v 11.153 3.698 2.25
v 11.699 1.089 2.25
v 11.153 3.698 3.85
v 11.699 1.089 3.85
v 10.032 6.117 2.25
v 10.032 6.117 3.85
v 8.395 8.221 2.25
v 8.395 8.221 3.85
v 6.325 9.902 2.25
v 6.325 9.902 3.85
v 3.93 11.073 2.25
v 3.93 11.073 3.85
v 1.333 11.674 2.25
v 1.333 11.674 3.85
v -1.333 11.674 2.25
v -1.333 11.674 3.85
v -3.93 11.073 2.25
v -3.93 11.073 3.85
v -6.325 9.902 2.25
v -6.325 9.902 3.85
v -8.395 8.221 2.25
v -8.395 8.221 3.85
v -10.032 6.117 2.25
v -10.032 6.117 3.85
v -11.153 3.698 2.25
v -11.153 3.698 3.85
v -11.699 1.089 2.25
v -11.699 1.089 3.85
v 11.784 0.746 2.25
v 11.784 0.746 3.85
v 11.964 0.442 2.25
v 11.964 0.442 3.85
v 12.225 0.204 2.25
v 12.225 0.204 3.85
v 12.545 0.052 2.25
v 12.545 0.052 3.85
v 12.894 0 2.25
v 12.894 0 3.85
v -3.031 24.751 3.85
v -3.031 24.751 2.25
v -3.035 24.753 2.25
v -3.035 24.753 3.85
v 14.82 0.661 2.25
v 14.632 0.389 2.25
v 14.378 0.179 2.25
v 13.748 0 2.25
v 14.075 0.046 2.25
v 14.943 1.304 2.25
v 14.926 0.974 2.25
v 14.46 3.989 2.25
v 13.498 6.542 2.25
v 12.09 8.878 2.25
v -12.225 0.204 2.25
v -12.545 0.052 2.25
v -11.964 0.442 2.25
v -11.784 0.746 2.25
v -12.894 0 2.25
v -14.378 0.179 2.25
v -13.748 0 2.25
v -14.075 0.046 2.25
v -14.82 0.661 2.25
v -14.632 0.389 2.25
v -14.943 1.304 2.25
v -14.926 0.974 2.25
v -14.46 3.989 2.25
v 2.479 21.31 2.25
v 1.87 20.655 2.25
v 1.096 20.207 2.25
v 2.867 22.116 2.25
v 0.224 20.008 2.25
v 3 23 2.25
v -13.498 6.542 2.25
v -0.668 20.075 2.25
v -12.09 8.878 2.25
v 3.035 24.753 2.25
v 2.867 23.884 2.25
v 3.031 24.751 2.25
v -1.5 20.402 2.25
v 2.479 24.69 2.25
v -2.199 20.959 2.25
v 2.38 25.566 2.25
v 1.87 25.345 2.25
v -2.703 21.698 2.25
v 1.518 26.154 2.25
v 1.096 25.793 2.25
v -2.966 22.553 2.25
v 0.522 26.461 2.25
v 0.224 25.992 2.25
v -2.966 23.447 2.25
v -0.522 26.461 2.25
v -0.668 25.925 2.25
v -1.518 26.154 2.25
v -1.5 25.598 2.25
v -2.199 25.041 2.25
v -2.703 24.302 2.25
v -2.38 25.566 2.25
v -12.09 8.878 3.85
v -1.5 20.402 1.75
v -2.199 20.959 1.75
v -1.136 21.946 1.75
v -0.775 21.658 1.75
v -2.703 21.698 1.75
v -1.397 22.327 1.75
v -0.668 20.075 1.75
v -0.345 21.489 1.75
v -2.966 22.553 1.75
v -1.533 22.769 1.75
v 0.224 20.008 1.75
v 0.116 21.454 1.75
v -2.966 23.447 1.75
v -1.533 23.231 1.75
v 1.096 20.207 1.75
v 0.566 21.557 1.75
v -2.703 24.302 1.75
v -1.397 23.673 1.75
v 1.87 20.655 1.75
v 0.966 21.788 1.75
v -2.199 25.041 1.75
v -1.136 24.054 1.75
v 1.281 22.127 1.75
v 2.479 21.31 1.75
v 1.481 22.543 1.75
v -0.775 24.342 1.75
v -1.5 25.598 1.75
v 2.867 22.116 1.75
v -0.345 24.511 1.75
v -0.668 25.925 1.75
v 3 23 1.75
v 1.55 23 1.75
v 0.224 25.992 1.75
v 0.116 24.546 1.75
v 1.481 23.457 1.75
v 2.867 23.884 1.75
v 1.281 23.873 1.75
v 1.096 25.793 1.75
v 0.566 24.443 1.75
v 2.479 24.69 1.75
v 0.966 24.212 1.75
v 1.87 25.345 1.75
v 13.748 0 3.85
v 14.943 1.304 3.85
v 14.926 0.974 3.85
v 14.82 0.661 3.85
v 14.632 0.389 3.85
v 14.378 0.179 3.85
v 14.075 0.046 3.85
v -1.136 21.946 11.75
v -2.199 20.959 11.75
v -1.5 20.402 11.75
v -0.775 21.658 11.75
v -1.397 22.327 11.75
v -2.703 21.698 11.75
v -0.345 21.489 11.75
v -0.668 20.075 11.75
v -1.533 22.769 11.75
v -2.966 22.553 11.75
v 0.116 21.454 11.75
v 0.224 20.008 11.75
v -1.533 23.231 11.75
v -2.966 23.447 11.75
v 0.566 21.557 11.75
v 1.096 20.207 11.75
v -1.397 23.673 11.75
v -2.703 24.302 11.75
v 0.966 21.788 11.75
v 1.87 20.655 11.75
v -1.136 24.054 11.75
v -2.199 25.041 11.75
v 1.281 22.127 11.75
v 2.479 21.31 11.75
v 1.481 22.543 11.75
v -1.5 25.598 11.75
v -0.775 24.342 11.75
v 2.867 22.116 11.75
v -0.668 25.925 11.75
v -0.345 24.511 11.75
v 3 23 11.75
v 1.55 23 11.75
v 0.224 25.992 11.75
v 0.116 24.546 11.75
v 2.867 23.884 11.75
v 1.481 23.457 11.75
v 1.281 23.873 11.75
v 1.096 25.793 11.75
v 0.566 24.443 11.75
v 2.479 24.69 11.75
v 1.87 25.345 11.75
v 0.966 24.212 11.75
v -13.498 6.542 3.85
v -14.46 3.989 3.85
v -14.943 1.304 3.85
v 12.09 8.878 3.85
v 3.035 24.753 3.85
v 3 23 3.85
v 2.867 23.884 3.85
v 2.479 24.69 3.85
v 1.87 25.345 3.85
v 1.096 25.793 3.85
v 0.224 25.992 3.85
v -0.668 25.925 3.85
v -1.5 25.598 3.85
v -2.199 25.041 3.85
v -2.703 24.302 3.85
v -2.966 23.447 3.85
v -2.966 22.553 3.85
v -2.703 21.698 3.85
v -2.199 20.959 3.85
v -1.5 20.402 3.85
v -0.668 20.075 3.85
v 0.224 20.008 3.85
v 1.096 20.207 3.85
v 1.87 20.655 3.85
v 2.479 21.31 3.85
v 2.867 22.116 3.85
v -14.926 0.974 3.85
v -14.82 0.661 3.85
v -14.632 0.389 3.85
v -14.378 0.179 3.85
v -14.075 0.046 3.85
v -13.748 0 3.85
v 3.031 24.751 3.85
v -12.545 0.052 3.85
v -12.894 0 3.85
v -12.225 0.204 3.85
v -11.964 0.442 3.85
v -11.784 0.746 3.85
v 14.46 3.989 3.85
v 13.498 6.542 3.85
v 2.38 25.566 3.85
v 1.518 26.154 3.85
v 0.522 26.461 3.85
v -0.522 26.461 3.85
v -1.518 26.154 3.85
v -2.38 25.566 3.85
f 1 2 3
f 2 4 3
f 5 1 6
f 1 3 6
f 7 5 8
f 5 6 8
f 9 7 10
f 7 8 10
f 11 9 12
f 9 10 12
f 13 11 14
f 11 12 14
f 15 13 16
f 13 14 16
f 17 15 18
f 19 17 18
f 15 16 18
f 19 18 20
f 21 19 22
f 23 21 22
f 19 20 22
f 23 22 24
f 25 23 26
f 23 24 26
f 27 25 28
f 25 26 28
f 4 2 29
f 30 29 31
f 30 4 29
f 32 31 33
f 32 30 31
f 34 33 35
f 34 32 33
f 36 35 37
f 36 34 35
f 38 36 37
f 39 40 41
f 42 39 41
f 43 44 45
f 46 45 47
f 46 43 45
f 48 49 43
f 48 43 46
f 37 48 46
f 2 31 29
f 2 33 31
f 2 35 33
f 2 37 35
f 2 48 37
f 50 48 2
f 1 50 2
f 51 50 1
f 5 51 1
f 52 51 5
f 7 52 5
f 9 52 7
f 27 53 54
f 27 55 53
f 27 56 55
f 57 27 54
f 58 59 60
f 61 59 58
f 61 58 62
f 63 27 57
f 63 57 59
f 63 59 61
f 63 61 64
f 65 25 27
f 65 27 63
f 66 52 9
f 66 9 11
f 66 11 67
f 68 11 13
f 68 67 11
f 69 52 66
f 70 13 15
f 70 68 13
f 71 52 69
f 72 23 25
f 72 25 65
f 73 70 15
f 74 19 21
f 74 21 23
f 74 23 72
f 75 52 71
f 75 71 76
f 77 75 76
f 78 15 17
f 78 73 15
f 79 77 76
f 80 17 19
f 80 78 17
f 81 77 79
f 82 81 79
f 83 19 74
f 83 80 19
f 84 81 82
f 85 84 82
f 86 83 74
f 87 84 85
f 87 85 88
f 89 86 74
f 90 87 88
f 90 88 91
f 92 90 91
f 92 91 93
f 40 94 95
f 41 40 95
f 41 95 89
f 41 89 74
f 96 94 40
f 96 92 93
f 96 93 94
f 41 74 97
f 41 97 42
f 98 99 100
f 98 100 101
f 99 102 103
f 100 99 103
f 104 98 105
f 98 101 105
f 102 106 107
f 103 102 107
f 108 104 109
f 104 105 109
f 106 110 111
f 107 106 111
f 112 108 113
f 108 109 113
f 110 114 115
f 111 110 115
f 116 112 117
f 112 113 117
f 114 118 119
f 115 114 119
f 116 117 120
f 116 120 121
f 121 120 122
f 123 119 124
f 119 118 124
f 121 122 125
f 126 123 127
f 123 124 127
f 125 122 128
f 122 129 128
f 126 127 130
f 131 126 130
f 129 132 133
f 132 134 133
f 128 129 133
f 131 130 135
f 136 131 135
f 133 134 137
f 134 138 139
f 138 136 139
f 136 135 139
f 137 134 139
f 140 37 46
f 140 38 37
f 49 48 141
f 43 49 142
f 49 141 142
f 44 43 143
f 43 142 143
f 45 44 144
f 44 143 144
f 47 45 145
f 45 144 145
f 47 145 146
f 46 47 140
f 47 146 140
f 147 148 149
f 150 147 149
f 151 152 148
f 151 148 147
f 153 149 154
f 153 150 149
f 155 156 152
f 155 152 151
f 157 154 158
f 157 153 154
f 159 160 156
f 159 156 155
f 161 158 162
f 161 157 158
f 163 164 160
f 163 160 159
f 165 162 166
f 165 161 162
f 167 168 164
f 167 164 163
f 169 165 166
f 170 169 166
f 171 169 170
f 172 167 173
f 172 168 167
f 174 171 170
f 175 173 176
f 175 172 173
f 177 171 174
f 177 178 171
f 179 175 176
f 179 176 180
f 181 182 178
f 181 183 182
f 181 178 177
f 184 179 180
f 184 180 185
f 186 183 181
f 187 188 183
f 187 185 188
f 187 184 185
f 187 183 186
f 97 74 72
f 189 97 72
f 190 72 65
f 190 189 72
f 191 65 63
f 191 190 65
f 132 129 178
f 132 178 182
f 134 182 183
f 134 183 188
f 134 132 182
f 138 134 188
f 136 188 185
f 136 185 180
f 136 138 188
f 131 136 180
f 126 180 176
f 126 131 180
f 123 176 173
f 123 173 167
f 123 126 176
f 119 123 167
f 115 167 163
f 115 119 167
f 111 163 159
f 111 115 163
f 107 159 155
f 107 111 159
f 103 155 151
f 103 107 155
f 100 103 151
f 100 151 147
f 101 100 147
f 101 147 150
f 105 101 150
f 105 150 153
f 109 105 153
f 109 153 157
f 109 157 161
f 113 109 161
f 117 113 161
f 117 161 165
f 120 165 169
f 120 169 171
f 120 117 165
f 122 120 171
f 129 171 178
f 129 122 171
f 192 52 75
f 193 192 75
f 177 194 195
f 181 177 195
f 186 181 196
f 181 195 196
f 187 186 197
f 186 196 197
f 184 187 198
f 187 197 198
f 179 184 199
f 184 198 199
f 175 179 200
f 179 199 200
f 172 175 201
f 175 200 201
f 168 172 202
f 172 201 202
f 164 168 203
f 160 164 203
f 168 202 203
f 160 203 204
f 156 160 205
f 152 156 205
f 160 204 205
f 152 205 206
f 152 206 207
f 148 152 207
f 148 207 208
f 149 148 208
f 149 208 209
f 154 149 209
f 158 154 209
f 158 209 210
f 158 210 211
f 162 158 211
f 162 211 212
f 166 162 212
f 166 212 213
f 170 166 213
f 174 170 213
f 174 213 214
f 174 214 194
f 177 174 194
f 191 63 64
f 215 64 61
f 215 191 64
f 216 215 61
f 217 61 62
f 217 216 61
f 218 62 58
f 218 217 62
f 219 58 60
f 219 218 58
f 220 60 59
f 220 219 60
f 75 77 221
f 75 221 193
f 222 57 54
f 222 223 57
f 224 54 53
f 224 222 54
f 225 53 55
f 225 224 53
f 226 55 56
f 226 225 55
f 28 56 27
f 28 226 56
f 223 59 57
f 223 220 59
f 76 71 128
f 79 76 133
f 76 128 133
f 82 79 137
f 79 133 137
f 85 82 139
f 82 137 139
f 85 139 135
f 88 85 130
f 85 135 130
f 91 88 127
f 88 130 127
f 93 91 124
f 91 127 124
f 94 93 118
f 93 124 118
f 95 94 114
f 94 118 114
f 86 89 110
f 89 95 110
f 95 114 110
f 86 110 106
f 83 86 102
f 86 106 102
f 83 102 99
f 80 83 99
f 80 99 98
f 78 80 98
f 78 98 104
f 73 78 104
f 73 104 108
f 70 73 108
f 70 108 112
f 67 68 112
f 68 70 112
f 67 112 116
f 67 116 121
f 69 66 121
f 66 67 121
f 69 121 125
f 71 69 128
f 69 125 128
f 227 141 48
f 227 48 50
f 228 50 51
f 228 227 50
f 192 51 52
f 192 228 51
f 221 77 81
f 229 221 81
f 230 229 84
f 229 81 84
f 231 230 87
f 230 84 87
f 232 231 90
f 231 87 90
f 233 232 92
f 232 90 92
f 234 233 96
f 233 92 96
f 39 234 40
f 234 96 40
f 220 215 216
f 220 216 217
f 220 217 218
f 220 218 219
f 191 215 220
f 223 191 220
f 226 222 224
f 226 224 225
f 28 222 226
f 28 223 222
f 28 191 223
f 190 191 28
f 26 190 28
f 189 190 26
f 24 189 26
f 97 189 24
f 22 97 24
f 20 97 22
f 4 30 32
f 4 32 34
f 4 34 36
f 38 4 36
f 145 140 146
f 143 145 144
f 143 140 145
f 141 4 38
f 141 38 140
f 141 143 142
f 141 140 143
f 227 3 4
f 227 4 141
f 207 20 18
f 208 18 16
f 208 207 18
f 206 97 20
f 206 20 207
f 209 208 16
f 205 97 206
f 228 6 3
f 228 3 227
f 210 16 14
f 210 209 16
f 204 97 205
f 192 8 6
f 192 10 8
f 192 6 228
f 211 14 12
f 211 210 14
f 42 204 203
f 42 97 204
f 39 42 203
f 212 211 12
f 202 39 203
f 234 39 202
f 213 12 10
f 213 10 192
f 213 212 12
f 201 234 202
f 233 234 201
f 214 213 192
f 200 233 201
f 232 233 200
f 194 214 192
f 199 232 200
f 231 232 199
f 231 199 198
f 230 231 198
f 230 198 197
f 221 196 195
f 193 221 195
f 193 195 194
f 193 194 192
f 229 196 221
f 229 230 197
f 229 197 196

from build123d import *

# Parameters (mm, degrees)
CYLINDER044_R          = 1.55
CYLINDER044_DEPTH      = 10
CYLINDER042_R          = 3
CYLINDER042_DEPTH      = 10
CYLINDER043_R          = 3.5
CYLINDER043_DEPTH      = 1.6
BOX_W                  = 7
BOX_H                  = 11
BOX_DEPTH              = 1.6
BOX001_W               = 2
BOX001_H               = 21.6
BOX001_DEPTH           = 1.6
BOX001_PLACEMENT_ANGLE = 29.7
BOX002_W               = 2
BOX002_H               = 21.6
BOX002_DEPTH           = 1.6
BOX002_PLACEMENT_ANGLE = 29.7
BOX004_W               = 15
BOX004_H               = 4.55
BOX004_DEPTH           = 1.6
BOX003_W               = 11
BOX003_H               = 4
BOX003_DEPTH           = 1.6
CYLINDER040_W          = 11.75
CYLINDER040_H          = 1.6
CYLINDER040_ANGLE      = 180
CYLINDER039_W          = 15
CYLINDER039_H          = 1.6
CYLINDER039_ANGLE      = 180
FILLET006_R            = 1.2


with BuildPart() as cylinder044:
    # Cylinder044 → Cylinder044 (new body)
    with BuildSketch(Plane(origin=(0, 23, -0.5), x_dir=(1, 0, 0), z_dir=(0, 0, 1))):
        Circle(CYLINDER044_R)
    extrude(amount=CYLINDER044_DEPTH)


with BuildPart() as cylinder042:
    # Cylinder042 → Cylinder042 (new body)
    with BuildSketch(Plane(origin=(0, 23, -0.5), x_dir=(1, 0, 0), z_dir=(0, 0, 1))):
        Circle(CYLINDER042_R)
    extrude(amount=CYLINDER042_DEPTH)


with BuildPart() as cylinder043:
    # Cylinder043 → Cylinder043 (new body)
    with BuildSketch(Plane(origin=(0, 23, 0), x_dir=(1, 0, 0), z_dir=(0, 0, 1))):
        Circle(CYLINDER043_R)
    extrude(amount=CYLINDER043_DEPTH)


with BuildPart() as cube:
    # Box → Box (new body)
    with BuildSketch(Plane(origin=(-3.5, 12, 0), x_dir=(1, 0, 0), z_dir=(0, 0, 1))):
        with Locations((3.5, 5.5)):
            Rectangle(BOX_W, BOX_H)
    extrude(amount=BOX_DEPTH)


with BuildPart() as cube001:
    # Box001 → Box001 (new body)
    with BuildSketch(Plane.XY):
        with Locations((1, 10.8)):
            Rectangle(BOX001_W, BOX001_H)
    extrude(amount=BOX001_DEPTH)


with BuildPart() as cube001_1:
    # Box001 placement: moved
    add(cube001.part.moved(Location((12, 5, 0))).rotate(Axis((12, 5, 0), (0, 0, 1)), BOX001_PLACEMENT_ANGLE))


with BuildPart() as cube002:
    # Box002 → Box002 (new body)
    with BuildSketch(Plane.XY):
        with Locations((1, 10.8)):
            Rectangle(BOX002_W, BOX002_H)
    extrude(amount=BOX002_DEPTH)


with BuildPart() as cube002_1:
    # Box002 placement: moved
    add(cube002.part.moved(Location((12, 5, 0))).rotate(Axis((12, 5, 0), (0, 0, 1)), BOX002_PLACEMENT_ANGLE))


with BuildPart() as part_mirroring:
    # Part__Mirroring: instance of Cube002
    add(cube002_1.part.mirror(Plane(origin=(0, 0, 0), x_dir=(0, -1, 0), z_dir=(1, 0, 0))))


with BuildPart() as cube004:
    # Box004 → Box004 (new body)
    with BuildSketch(Plane(origin=(-7.5, 12, 0), x_dir=(1, 0, 0), z_dir=(0, 0, 1))):
        with Locations((7.5, 2.275)):
            Rectangle(BOX004_W, BOX004_H)
    extrude(amount=BOX004_DEPTH)


with BuildPart() as cube003:
    # Box003 → Box003 (new body)
    with BuildSketch(Plane(origin=(-5.5, 16, 0), x_dir=(1, 0, 0), z_dir=(0, 0, 1))):
        with Locations((5.5, 2)):
            Rectangle(BOX003_W, BOX003_H)
    extrude(amount=BOX003_DEPTH)


with BuildPart() as cylinder040:
    # Cylinder040 → Cylinder040 (revolve)
    with BuildSketch(Plane.XZ):
        with Locations((5.875, 0.8)):
            Rectangle(CYLINDER040_W, CYLINDER040_H)
    revolve(axis=Axis((0, 0, 0), (0, 0, 1)), revolution_arc=CYLINDER040_ANGLE)


with BuildPart() as fillet006:
    # Cylinder039 → Cylinder039 (revolve)
    with BuildSketch(Plane.XZ):
        with Locations((7.5, 0.8)):
            Rectangle(CYLINDER039_W, CYLINDER039_H)
    revolve(axis=Axis((0, 0, 0), (0, 0, 1)), revolution_arc=CYLINDER039_ANGLE)

    # Cut017: cut Cylinder040
    add(cylinder040.part, mode=Mode.SUBTRACT)

    # Fusion012: union Cylinder043, Cube, Cube001, Part__Mirroring, Cube004, Cube003
    add(cylinder043.part)
    add(cube.part)
    add(cube001_1.part)
    add(part_mirroring.part)
    add(cube004.part)
    add(cube003.part)

    # Fusion013: union Cylinder042
    add(cylinder042.part)

    # Cut018: cut Cylinder044
    add(cylinder044.part, mode=Mode.SUBTRACT)

    # Fillet006
    fillet006_edges = [fillet006.edges().sort_by_distance(p)[0] for p in [
        (-15, 0, 0.8),
        (-11.75, 0, 0.8),
        (11.75, 0, 0.8),
        (15, 0, 0.8),
    ]]
    fillet(fillet006_edges, radius=FILLET006_R)


with BuildPart() as fillet006_1:
    # Fillet006 placement: moved
    add(fillet006.part.moved(Location((0, 0, 2.25))))


solid = fillet006_1.part
